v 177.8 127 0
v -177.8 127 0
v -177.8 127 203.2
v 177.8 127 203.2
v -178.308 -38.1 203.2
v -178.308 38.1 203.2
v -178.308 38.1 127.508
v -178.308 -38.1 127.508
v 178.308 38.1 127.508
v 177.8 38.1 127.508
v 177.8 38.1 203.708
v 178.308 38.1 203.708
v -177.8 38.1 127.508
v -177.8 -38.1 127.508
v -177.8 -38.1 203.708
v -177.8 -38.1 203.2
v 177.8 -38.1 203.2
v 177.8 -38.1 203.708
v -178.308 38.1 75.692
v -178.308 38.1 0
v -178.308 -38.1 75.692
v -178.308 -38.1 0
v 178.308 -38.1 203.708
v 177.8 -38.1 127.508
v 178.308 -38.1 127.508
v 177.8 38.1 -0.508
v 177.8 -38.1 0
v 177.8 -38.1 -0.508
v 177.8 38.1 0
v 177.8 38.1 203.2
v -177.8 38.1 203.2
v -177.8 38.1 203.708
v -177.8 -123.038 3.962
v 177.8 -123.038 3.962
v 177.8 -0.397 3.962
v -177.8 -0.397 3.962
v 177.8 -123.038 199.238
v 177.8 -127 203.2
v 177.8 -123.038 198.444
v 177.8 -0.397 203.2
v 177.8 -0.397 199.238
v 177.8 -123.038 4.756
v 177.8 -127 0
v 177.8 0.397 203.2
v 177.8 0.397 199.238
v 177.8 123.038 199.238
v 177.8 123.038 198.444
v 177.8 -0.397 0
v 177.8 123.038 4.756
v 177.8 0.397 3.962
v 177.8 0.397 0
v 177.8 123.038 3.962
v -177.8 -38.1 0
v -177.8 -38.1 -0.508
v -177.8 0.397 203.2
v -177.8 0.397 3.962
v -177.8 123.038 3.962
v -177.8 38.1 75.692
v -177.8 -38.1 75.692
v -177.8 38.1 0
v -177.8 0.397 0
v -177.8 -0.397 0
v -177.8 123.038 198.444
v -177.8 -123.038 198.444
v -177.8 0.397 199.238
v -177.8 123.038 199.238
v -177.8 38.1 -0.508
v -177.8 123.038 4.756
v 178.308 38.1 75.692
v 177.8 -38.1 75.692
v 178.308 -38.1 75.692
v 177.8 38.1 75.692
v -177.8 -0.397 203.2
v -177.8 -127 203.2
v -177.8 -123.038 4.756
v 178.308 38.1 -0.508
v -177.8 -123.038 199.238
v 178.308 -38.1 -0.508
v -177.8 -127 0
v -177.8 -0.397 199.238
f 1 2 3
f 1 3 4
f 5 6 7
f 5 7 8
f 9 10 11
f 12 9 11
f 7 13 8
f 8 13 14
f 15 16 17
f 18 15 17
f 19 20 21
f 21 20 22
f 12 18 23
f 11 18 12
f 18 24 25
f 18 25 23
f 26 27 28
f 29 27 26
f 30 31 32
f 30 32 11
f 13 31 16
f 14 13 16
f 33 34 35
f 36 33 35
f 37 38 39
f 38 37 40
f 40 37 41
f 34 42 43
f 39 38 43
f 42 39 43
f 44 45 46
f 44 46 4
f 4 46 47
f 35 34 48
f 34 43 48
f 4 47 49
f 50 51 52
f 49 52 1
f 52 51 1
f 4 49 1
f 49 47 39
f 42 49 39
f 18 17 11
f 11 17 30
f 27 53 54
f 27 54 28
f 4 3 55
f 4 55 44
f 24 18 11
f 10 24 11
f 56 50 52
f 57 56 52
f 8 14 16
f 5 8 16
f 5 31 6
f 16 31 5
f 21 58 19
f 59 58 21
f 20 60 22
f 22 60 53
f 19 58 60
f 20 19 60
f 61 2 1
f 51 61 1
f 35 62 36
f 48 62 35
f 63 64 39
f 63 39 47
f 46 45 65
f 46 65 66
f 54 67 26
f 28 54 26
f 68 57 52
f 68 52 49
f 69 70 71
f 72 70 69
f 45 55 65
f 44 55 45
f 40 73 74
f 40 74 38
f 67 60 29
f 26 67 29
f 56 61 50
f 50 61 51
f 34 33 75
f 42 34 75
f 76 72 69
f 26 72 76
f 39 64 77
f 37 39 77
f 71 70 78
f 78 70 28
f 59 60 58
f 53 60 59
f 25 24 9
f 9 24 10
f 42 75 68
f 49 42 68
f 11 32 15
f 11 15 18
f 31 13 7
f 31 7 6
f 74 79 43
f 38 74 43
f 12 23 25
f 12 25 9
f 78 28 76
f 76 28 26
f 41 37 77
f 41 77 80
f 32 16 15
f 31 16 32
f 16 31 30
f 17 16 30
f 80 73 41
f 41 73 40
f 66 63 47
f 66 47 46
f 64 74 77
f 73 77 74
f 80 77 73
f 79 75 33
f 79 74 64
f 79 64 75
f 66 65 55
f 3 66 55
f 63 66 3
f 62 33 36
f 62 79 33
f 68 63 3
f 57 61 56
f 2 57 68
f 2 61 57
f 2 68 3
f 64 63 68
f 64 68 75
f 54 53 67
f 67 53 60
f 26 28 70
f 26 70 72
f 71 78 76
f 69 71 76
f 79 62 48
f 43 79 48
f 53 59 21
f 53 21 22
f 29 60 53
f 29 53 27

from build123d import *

# Parameters (mm, degrees)
F0_W      = 355.6
F0_H      = 254
F1_DEPTH  = 203.2
F2_W      = 355.6
F2_H      = 0.79375
F3_DEPTH  = 3.9624
F4_W      = 355.6
F4_H      = 0.79375
F5_DEPTH  = 3.9624
F6_W      = 355.6
F6_H      = 76.2
F7_DEPTH  = 0.508
F8_W      = 76.2
F8_H      = 76.2
F9_DEPTH  = 0.508
F10_W     = 76.2
F10_H     = 75.692
F11_DEPTH = 0.508
F14_W     = 246.0752
F14_H     = 0.79375
F15_DEPTH = 356.109


with BuildPart() as f1:
    # F0 (on Top) → F1 (new body)
    with BuildSketch(Plane.XY):
        Rectangle(F0_W, F0_H)
    extrude(amount=F1_DEPTH)

    # F2 (on face) → F3 (cut)
    with BuildSketch(Plane.XY.offset(203.2)):
        Rectangle(F2_W, F2_H)
    extrude(amount=-F3_DEPTH, mode=Mode.SUBTRACT)

    # F4 (on face) → F5 (cut)
    with BuildSketch(Plane(origin=(0, 0, 0), x_dir=(1, 0, 0), z_dir=(0, 0, -1))):
        Rectangle(F4_W, F4_H)
    extrude(amount=-F5_DEPTH, mode=Mode.SUBTRACT)

    # F14 (on face) → F15 (cut, through all)
    with BuildSketch(Plane.YZ.offset(177.8)):
        with Locations((0, 198.840725)):
            Rectangle(F14_W, F14_H)
        with Locations((0, 4.359275)):
            Rectangle(F14_W, F14_H)
    extrude(amount=-F15_DEPTH, mode=Mode.SUBTRACT)


with BuildPart() as f7:
    # F6 (on face) → F7 (new body)
    with BuildSketch(Plane.XY.offset(203.2)):
        Rectangle(F6_W, F6_H)
    extrude(amount=F7_DEPTH)


with BuildPart() as f9:
    # F8 (on face) → F9 (new body)
    with BuildSketch(Plane.YZ.offset(177.8)):
        with Locations((0, 165.608)):
            Rectangle(F8_W, F8_H)
    extrude(amount=F9_DEPTH)


with BuildPart() as f11:
    # F10 (on face) → F11 (new body)
    with BuildSketch(Plane(origin=(-177.8, 0, 0), x_dir=(0, -1, 0), z_dir=(-1, 0, 0))):
        with Locations((0, 165.354)):
            Rectangle(F10_W, F10_H)
    extrude(amount=F11_DEPTH)


with BuildPart() as f13_1:
    # F13: instance of F11
    add(f11.part.mirror(Plane.XY.offset(101.6)))


with BuildPart() as f13_2:
    # F13: instance of F9
    add(f9.part.mirror(Plane.XY.offset(101.6)))


with BuildPart() as f13_3:
    # F13: instance of F7
    add(f7.part.mirror(Plane.XY.offset(101.6)))


solid = Compound([f1.part, f7.part, f9.part, f11.part, f13_1.part, f13_2.part, f13_3.part])
